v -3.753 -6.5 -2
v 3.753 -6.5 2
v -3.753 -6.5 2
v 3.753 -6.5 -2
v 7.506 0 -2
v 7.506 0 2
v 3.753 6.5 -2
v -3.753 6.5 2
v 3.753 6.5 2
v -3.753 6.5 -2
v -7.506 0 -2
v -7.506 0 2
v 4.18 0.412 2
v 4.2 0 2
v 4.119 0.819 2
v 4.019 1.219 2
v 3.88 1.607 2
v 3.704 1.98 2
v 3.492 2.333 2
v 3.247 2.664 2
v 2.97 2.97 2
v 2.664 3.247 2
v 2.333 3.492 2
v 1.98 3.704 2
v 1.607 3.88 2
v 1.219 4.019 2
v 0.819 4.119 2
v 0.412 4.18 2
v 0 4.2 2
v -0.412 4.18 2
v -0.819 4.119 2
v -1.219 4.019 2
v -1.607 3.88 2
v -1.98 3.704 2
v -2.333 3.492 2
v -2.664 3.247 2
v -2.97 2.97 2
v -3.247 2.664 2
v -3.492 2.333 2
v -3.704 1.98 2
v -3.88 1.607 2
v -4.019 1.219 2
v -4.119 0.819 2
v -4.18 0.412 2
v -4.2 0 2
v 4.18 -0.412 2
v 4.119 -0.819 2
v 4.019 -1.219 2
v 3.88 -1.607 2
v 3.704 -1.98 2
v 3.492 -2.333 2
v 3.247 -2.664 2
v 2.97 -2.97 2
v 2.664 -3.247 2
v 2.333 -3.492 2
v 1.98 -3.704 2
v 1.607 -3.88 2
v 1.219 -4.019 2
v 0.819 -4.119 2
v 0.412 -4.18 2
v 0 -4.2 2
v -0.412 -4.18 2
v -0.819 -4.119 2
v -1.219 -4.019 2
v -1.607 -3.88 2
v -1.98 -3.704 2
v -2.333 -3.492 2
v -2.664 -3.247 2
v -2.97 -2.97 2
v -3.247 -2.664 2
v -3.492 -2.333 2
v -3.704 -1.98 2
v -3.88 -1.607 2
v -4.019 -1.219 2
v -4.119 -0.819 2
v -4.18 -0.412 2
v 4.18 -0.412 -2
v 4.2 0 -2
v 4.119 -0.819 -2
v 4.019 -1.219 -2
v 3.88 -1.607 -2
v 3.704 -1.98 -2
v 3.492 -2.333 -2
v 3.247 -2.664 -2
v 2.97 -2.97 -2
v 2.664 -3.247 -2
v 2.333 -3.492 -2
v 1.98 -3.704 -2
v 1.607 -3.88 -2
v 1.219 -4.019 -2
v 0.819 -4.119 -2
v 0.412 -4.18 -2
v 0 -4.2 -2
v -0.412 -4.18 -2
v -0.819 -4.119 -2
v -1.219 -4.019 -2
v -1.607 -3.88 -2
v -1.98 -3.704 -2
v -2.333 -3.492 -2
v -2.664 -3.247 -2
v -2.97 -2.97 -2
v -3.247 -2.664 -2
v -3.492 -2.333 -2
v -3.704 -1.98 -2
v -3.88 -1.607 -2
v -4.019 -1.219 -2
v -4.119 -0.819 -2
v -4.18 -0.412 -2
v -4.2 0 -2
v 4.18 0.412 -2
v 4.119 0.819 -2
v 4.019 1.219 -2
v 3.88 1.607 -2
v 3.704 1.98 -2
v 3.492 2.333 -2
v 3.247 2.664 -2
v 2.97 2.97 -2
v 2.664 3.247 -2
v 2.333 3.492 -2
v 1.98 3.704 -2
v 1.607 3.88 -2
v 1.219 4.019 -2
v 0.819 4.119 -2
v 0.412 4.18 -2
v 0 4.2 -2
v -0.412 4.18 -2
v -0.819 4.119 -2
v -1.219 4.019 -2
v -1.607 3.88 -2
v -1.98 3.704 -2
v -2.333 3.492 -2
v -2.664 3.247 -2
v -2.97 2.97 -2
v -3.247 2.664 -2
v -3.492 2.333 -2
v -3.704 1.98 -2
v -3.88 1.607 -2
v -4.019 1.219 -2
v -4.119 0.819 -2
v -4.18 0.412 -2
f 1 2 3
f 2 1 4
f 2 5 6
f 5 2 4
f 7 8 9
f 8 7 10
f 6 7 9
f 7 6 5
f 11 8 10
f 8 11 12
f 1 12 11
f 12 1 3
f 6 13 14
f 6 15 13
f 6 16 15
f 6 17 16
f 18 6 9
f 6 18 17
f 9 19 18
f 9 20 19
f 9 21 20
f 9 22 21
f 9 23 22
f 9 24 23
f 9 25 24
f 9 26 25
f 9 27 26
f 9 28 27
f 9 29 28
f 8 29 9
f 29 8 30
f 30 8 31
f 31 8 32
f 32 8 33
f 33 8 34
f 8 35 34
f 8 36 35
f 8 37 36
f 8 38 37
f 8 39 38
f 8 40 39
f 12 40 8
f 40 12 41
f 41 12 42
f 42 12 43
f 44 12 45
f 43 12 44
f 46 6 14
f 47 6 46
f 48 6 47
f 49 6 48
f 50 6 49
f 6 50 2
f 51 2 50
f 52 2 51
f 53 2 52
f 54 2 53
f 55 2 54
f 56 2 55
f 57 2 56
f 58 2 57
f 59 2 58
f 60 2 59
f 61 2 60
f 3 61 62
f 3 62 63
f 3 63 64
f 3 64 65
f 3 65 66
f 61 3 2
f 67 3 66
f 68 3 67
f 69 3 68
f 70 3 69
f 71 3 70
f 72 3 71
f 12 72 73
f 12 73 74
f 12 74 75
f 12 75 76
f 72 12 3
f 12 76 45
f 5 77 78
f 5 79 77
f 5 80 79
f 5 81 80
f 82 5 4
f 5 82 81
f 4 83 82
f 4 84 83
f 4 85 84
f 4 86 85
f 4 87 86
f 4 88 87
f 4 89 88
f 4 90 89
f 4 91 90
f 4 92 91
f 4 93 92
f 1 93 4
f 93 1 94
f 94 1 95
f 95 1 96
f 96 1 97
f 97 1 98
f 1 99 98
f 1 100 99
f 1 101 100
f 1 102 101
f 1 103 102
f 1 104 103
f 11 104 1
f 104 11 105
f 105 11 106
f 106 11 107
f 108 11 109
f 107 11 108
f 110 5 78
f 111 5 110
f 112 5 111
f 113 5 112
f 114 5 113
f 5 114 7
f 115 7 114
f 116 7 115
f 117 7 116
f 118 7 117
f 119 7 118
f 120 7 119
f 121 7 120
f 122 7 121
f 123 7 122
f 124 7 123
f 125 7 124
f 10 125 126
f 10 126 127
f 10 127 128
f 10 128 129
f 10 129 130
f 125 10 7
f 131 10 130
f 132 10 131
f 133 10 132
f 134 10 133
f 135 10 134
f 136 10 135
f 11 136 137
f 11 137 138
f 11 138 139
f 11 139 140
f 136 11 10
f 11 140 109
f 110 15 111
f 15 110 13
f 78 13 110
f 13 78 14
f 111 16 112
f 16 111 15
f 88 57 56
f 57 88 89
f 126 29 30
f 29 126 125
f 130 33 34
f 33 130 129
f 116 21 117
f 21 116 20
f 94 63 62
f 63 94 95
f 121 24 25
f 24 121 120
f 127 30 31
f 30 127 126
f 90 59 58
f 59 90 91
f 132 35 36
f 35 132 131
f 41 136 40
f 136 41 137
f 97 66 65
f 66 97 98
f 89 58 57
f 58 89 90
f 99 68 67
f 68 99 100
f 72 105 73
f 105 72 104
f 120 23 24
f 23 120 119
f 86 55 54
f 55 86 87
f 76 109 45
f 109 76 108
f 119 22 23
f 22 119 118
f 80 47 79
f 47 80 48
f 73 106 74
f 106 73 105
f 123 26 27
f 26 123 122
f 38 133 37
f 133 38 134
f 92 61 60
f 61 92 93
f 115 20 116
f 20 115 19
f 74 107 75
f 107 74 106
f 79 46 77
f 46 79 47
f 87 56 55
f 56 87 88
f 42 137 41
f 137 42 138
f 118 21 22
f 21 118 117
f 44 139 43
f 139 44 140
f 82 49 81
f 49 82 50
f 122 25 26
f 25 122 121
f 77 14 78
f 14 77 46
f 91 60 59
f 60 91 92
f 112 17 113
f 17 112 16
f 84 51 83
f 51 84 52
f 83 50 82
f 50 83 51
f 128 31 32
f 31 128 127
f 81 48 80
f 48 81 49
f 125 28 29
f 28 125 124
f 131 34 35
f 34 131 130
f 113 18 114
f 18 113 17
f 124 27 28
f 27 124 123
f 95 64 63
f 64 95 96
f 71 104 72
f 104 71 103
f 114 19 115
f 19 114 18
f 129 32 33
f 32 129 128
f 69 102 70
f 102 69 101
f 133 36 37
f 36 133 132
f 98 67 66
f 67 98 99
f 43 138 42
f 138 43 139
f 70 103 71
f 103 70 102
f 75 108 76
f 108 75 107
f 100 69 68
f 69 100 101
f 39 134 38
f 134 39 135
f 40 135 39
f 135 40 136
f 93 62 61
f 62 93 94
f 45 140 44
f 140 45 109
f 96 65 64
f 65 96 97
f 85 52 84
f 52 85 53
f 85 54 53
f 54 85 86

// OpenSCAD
$fn=64;

module hex_prism_af(af=13.0, h=4.0){
    r = af / sqrt(3);
    cylinder(h=h, r=r, center=true, $fn=6);
}

module thin_hex_nut(m_screw=8.0, af=13.0, thickness=4.0, clearance=0.4){
    hole_d = m_screw + clearance;
    difference(){
        hex_prism_af(af=af, h=thickness);
        cylinder(h=thickness+0.6, d=hole_d, center=true, $fn=64);
    }
}

thin_hex_nut(m_screw=8.0, af=13.0, thickness=4.0, clearance=0.4);
